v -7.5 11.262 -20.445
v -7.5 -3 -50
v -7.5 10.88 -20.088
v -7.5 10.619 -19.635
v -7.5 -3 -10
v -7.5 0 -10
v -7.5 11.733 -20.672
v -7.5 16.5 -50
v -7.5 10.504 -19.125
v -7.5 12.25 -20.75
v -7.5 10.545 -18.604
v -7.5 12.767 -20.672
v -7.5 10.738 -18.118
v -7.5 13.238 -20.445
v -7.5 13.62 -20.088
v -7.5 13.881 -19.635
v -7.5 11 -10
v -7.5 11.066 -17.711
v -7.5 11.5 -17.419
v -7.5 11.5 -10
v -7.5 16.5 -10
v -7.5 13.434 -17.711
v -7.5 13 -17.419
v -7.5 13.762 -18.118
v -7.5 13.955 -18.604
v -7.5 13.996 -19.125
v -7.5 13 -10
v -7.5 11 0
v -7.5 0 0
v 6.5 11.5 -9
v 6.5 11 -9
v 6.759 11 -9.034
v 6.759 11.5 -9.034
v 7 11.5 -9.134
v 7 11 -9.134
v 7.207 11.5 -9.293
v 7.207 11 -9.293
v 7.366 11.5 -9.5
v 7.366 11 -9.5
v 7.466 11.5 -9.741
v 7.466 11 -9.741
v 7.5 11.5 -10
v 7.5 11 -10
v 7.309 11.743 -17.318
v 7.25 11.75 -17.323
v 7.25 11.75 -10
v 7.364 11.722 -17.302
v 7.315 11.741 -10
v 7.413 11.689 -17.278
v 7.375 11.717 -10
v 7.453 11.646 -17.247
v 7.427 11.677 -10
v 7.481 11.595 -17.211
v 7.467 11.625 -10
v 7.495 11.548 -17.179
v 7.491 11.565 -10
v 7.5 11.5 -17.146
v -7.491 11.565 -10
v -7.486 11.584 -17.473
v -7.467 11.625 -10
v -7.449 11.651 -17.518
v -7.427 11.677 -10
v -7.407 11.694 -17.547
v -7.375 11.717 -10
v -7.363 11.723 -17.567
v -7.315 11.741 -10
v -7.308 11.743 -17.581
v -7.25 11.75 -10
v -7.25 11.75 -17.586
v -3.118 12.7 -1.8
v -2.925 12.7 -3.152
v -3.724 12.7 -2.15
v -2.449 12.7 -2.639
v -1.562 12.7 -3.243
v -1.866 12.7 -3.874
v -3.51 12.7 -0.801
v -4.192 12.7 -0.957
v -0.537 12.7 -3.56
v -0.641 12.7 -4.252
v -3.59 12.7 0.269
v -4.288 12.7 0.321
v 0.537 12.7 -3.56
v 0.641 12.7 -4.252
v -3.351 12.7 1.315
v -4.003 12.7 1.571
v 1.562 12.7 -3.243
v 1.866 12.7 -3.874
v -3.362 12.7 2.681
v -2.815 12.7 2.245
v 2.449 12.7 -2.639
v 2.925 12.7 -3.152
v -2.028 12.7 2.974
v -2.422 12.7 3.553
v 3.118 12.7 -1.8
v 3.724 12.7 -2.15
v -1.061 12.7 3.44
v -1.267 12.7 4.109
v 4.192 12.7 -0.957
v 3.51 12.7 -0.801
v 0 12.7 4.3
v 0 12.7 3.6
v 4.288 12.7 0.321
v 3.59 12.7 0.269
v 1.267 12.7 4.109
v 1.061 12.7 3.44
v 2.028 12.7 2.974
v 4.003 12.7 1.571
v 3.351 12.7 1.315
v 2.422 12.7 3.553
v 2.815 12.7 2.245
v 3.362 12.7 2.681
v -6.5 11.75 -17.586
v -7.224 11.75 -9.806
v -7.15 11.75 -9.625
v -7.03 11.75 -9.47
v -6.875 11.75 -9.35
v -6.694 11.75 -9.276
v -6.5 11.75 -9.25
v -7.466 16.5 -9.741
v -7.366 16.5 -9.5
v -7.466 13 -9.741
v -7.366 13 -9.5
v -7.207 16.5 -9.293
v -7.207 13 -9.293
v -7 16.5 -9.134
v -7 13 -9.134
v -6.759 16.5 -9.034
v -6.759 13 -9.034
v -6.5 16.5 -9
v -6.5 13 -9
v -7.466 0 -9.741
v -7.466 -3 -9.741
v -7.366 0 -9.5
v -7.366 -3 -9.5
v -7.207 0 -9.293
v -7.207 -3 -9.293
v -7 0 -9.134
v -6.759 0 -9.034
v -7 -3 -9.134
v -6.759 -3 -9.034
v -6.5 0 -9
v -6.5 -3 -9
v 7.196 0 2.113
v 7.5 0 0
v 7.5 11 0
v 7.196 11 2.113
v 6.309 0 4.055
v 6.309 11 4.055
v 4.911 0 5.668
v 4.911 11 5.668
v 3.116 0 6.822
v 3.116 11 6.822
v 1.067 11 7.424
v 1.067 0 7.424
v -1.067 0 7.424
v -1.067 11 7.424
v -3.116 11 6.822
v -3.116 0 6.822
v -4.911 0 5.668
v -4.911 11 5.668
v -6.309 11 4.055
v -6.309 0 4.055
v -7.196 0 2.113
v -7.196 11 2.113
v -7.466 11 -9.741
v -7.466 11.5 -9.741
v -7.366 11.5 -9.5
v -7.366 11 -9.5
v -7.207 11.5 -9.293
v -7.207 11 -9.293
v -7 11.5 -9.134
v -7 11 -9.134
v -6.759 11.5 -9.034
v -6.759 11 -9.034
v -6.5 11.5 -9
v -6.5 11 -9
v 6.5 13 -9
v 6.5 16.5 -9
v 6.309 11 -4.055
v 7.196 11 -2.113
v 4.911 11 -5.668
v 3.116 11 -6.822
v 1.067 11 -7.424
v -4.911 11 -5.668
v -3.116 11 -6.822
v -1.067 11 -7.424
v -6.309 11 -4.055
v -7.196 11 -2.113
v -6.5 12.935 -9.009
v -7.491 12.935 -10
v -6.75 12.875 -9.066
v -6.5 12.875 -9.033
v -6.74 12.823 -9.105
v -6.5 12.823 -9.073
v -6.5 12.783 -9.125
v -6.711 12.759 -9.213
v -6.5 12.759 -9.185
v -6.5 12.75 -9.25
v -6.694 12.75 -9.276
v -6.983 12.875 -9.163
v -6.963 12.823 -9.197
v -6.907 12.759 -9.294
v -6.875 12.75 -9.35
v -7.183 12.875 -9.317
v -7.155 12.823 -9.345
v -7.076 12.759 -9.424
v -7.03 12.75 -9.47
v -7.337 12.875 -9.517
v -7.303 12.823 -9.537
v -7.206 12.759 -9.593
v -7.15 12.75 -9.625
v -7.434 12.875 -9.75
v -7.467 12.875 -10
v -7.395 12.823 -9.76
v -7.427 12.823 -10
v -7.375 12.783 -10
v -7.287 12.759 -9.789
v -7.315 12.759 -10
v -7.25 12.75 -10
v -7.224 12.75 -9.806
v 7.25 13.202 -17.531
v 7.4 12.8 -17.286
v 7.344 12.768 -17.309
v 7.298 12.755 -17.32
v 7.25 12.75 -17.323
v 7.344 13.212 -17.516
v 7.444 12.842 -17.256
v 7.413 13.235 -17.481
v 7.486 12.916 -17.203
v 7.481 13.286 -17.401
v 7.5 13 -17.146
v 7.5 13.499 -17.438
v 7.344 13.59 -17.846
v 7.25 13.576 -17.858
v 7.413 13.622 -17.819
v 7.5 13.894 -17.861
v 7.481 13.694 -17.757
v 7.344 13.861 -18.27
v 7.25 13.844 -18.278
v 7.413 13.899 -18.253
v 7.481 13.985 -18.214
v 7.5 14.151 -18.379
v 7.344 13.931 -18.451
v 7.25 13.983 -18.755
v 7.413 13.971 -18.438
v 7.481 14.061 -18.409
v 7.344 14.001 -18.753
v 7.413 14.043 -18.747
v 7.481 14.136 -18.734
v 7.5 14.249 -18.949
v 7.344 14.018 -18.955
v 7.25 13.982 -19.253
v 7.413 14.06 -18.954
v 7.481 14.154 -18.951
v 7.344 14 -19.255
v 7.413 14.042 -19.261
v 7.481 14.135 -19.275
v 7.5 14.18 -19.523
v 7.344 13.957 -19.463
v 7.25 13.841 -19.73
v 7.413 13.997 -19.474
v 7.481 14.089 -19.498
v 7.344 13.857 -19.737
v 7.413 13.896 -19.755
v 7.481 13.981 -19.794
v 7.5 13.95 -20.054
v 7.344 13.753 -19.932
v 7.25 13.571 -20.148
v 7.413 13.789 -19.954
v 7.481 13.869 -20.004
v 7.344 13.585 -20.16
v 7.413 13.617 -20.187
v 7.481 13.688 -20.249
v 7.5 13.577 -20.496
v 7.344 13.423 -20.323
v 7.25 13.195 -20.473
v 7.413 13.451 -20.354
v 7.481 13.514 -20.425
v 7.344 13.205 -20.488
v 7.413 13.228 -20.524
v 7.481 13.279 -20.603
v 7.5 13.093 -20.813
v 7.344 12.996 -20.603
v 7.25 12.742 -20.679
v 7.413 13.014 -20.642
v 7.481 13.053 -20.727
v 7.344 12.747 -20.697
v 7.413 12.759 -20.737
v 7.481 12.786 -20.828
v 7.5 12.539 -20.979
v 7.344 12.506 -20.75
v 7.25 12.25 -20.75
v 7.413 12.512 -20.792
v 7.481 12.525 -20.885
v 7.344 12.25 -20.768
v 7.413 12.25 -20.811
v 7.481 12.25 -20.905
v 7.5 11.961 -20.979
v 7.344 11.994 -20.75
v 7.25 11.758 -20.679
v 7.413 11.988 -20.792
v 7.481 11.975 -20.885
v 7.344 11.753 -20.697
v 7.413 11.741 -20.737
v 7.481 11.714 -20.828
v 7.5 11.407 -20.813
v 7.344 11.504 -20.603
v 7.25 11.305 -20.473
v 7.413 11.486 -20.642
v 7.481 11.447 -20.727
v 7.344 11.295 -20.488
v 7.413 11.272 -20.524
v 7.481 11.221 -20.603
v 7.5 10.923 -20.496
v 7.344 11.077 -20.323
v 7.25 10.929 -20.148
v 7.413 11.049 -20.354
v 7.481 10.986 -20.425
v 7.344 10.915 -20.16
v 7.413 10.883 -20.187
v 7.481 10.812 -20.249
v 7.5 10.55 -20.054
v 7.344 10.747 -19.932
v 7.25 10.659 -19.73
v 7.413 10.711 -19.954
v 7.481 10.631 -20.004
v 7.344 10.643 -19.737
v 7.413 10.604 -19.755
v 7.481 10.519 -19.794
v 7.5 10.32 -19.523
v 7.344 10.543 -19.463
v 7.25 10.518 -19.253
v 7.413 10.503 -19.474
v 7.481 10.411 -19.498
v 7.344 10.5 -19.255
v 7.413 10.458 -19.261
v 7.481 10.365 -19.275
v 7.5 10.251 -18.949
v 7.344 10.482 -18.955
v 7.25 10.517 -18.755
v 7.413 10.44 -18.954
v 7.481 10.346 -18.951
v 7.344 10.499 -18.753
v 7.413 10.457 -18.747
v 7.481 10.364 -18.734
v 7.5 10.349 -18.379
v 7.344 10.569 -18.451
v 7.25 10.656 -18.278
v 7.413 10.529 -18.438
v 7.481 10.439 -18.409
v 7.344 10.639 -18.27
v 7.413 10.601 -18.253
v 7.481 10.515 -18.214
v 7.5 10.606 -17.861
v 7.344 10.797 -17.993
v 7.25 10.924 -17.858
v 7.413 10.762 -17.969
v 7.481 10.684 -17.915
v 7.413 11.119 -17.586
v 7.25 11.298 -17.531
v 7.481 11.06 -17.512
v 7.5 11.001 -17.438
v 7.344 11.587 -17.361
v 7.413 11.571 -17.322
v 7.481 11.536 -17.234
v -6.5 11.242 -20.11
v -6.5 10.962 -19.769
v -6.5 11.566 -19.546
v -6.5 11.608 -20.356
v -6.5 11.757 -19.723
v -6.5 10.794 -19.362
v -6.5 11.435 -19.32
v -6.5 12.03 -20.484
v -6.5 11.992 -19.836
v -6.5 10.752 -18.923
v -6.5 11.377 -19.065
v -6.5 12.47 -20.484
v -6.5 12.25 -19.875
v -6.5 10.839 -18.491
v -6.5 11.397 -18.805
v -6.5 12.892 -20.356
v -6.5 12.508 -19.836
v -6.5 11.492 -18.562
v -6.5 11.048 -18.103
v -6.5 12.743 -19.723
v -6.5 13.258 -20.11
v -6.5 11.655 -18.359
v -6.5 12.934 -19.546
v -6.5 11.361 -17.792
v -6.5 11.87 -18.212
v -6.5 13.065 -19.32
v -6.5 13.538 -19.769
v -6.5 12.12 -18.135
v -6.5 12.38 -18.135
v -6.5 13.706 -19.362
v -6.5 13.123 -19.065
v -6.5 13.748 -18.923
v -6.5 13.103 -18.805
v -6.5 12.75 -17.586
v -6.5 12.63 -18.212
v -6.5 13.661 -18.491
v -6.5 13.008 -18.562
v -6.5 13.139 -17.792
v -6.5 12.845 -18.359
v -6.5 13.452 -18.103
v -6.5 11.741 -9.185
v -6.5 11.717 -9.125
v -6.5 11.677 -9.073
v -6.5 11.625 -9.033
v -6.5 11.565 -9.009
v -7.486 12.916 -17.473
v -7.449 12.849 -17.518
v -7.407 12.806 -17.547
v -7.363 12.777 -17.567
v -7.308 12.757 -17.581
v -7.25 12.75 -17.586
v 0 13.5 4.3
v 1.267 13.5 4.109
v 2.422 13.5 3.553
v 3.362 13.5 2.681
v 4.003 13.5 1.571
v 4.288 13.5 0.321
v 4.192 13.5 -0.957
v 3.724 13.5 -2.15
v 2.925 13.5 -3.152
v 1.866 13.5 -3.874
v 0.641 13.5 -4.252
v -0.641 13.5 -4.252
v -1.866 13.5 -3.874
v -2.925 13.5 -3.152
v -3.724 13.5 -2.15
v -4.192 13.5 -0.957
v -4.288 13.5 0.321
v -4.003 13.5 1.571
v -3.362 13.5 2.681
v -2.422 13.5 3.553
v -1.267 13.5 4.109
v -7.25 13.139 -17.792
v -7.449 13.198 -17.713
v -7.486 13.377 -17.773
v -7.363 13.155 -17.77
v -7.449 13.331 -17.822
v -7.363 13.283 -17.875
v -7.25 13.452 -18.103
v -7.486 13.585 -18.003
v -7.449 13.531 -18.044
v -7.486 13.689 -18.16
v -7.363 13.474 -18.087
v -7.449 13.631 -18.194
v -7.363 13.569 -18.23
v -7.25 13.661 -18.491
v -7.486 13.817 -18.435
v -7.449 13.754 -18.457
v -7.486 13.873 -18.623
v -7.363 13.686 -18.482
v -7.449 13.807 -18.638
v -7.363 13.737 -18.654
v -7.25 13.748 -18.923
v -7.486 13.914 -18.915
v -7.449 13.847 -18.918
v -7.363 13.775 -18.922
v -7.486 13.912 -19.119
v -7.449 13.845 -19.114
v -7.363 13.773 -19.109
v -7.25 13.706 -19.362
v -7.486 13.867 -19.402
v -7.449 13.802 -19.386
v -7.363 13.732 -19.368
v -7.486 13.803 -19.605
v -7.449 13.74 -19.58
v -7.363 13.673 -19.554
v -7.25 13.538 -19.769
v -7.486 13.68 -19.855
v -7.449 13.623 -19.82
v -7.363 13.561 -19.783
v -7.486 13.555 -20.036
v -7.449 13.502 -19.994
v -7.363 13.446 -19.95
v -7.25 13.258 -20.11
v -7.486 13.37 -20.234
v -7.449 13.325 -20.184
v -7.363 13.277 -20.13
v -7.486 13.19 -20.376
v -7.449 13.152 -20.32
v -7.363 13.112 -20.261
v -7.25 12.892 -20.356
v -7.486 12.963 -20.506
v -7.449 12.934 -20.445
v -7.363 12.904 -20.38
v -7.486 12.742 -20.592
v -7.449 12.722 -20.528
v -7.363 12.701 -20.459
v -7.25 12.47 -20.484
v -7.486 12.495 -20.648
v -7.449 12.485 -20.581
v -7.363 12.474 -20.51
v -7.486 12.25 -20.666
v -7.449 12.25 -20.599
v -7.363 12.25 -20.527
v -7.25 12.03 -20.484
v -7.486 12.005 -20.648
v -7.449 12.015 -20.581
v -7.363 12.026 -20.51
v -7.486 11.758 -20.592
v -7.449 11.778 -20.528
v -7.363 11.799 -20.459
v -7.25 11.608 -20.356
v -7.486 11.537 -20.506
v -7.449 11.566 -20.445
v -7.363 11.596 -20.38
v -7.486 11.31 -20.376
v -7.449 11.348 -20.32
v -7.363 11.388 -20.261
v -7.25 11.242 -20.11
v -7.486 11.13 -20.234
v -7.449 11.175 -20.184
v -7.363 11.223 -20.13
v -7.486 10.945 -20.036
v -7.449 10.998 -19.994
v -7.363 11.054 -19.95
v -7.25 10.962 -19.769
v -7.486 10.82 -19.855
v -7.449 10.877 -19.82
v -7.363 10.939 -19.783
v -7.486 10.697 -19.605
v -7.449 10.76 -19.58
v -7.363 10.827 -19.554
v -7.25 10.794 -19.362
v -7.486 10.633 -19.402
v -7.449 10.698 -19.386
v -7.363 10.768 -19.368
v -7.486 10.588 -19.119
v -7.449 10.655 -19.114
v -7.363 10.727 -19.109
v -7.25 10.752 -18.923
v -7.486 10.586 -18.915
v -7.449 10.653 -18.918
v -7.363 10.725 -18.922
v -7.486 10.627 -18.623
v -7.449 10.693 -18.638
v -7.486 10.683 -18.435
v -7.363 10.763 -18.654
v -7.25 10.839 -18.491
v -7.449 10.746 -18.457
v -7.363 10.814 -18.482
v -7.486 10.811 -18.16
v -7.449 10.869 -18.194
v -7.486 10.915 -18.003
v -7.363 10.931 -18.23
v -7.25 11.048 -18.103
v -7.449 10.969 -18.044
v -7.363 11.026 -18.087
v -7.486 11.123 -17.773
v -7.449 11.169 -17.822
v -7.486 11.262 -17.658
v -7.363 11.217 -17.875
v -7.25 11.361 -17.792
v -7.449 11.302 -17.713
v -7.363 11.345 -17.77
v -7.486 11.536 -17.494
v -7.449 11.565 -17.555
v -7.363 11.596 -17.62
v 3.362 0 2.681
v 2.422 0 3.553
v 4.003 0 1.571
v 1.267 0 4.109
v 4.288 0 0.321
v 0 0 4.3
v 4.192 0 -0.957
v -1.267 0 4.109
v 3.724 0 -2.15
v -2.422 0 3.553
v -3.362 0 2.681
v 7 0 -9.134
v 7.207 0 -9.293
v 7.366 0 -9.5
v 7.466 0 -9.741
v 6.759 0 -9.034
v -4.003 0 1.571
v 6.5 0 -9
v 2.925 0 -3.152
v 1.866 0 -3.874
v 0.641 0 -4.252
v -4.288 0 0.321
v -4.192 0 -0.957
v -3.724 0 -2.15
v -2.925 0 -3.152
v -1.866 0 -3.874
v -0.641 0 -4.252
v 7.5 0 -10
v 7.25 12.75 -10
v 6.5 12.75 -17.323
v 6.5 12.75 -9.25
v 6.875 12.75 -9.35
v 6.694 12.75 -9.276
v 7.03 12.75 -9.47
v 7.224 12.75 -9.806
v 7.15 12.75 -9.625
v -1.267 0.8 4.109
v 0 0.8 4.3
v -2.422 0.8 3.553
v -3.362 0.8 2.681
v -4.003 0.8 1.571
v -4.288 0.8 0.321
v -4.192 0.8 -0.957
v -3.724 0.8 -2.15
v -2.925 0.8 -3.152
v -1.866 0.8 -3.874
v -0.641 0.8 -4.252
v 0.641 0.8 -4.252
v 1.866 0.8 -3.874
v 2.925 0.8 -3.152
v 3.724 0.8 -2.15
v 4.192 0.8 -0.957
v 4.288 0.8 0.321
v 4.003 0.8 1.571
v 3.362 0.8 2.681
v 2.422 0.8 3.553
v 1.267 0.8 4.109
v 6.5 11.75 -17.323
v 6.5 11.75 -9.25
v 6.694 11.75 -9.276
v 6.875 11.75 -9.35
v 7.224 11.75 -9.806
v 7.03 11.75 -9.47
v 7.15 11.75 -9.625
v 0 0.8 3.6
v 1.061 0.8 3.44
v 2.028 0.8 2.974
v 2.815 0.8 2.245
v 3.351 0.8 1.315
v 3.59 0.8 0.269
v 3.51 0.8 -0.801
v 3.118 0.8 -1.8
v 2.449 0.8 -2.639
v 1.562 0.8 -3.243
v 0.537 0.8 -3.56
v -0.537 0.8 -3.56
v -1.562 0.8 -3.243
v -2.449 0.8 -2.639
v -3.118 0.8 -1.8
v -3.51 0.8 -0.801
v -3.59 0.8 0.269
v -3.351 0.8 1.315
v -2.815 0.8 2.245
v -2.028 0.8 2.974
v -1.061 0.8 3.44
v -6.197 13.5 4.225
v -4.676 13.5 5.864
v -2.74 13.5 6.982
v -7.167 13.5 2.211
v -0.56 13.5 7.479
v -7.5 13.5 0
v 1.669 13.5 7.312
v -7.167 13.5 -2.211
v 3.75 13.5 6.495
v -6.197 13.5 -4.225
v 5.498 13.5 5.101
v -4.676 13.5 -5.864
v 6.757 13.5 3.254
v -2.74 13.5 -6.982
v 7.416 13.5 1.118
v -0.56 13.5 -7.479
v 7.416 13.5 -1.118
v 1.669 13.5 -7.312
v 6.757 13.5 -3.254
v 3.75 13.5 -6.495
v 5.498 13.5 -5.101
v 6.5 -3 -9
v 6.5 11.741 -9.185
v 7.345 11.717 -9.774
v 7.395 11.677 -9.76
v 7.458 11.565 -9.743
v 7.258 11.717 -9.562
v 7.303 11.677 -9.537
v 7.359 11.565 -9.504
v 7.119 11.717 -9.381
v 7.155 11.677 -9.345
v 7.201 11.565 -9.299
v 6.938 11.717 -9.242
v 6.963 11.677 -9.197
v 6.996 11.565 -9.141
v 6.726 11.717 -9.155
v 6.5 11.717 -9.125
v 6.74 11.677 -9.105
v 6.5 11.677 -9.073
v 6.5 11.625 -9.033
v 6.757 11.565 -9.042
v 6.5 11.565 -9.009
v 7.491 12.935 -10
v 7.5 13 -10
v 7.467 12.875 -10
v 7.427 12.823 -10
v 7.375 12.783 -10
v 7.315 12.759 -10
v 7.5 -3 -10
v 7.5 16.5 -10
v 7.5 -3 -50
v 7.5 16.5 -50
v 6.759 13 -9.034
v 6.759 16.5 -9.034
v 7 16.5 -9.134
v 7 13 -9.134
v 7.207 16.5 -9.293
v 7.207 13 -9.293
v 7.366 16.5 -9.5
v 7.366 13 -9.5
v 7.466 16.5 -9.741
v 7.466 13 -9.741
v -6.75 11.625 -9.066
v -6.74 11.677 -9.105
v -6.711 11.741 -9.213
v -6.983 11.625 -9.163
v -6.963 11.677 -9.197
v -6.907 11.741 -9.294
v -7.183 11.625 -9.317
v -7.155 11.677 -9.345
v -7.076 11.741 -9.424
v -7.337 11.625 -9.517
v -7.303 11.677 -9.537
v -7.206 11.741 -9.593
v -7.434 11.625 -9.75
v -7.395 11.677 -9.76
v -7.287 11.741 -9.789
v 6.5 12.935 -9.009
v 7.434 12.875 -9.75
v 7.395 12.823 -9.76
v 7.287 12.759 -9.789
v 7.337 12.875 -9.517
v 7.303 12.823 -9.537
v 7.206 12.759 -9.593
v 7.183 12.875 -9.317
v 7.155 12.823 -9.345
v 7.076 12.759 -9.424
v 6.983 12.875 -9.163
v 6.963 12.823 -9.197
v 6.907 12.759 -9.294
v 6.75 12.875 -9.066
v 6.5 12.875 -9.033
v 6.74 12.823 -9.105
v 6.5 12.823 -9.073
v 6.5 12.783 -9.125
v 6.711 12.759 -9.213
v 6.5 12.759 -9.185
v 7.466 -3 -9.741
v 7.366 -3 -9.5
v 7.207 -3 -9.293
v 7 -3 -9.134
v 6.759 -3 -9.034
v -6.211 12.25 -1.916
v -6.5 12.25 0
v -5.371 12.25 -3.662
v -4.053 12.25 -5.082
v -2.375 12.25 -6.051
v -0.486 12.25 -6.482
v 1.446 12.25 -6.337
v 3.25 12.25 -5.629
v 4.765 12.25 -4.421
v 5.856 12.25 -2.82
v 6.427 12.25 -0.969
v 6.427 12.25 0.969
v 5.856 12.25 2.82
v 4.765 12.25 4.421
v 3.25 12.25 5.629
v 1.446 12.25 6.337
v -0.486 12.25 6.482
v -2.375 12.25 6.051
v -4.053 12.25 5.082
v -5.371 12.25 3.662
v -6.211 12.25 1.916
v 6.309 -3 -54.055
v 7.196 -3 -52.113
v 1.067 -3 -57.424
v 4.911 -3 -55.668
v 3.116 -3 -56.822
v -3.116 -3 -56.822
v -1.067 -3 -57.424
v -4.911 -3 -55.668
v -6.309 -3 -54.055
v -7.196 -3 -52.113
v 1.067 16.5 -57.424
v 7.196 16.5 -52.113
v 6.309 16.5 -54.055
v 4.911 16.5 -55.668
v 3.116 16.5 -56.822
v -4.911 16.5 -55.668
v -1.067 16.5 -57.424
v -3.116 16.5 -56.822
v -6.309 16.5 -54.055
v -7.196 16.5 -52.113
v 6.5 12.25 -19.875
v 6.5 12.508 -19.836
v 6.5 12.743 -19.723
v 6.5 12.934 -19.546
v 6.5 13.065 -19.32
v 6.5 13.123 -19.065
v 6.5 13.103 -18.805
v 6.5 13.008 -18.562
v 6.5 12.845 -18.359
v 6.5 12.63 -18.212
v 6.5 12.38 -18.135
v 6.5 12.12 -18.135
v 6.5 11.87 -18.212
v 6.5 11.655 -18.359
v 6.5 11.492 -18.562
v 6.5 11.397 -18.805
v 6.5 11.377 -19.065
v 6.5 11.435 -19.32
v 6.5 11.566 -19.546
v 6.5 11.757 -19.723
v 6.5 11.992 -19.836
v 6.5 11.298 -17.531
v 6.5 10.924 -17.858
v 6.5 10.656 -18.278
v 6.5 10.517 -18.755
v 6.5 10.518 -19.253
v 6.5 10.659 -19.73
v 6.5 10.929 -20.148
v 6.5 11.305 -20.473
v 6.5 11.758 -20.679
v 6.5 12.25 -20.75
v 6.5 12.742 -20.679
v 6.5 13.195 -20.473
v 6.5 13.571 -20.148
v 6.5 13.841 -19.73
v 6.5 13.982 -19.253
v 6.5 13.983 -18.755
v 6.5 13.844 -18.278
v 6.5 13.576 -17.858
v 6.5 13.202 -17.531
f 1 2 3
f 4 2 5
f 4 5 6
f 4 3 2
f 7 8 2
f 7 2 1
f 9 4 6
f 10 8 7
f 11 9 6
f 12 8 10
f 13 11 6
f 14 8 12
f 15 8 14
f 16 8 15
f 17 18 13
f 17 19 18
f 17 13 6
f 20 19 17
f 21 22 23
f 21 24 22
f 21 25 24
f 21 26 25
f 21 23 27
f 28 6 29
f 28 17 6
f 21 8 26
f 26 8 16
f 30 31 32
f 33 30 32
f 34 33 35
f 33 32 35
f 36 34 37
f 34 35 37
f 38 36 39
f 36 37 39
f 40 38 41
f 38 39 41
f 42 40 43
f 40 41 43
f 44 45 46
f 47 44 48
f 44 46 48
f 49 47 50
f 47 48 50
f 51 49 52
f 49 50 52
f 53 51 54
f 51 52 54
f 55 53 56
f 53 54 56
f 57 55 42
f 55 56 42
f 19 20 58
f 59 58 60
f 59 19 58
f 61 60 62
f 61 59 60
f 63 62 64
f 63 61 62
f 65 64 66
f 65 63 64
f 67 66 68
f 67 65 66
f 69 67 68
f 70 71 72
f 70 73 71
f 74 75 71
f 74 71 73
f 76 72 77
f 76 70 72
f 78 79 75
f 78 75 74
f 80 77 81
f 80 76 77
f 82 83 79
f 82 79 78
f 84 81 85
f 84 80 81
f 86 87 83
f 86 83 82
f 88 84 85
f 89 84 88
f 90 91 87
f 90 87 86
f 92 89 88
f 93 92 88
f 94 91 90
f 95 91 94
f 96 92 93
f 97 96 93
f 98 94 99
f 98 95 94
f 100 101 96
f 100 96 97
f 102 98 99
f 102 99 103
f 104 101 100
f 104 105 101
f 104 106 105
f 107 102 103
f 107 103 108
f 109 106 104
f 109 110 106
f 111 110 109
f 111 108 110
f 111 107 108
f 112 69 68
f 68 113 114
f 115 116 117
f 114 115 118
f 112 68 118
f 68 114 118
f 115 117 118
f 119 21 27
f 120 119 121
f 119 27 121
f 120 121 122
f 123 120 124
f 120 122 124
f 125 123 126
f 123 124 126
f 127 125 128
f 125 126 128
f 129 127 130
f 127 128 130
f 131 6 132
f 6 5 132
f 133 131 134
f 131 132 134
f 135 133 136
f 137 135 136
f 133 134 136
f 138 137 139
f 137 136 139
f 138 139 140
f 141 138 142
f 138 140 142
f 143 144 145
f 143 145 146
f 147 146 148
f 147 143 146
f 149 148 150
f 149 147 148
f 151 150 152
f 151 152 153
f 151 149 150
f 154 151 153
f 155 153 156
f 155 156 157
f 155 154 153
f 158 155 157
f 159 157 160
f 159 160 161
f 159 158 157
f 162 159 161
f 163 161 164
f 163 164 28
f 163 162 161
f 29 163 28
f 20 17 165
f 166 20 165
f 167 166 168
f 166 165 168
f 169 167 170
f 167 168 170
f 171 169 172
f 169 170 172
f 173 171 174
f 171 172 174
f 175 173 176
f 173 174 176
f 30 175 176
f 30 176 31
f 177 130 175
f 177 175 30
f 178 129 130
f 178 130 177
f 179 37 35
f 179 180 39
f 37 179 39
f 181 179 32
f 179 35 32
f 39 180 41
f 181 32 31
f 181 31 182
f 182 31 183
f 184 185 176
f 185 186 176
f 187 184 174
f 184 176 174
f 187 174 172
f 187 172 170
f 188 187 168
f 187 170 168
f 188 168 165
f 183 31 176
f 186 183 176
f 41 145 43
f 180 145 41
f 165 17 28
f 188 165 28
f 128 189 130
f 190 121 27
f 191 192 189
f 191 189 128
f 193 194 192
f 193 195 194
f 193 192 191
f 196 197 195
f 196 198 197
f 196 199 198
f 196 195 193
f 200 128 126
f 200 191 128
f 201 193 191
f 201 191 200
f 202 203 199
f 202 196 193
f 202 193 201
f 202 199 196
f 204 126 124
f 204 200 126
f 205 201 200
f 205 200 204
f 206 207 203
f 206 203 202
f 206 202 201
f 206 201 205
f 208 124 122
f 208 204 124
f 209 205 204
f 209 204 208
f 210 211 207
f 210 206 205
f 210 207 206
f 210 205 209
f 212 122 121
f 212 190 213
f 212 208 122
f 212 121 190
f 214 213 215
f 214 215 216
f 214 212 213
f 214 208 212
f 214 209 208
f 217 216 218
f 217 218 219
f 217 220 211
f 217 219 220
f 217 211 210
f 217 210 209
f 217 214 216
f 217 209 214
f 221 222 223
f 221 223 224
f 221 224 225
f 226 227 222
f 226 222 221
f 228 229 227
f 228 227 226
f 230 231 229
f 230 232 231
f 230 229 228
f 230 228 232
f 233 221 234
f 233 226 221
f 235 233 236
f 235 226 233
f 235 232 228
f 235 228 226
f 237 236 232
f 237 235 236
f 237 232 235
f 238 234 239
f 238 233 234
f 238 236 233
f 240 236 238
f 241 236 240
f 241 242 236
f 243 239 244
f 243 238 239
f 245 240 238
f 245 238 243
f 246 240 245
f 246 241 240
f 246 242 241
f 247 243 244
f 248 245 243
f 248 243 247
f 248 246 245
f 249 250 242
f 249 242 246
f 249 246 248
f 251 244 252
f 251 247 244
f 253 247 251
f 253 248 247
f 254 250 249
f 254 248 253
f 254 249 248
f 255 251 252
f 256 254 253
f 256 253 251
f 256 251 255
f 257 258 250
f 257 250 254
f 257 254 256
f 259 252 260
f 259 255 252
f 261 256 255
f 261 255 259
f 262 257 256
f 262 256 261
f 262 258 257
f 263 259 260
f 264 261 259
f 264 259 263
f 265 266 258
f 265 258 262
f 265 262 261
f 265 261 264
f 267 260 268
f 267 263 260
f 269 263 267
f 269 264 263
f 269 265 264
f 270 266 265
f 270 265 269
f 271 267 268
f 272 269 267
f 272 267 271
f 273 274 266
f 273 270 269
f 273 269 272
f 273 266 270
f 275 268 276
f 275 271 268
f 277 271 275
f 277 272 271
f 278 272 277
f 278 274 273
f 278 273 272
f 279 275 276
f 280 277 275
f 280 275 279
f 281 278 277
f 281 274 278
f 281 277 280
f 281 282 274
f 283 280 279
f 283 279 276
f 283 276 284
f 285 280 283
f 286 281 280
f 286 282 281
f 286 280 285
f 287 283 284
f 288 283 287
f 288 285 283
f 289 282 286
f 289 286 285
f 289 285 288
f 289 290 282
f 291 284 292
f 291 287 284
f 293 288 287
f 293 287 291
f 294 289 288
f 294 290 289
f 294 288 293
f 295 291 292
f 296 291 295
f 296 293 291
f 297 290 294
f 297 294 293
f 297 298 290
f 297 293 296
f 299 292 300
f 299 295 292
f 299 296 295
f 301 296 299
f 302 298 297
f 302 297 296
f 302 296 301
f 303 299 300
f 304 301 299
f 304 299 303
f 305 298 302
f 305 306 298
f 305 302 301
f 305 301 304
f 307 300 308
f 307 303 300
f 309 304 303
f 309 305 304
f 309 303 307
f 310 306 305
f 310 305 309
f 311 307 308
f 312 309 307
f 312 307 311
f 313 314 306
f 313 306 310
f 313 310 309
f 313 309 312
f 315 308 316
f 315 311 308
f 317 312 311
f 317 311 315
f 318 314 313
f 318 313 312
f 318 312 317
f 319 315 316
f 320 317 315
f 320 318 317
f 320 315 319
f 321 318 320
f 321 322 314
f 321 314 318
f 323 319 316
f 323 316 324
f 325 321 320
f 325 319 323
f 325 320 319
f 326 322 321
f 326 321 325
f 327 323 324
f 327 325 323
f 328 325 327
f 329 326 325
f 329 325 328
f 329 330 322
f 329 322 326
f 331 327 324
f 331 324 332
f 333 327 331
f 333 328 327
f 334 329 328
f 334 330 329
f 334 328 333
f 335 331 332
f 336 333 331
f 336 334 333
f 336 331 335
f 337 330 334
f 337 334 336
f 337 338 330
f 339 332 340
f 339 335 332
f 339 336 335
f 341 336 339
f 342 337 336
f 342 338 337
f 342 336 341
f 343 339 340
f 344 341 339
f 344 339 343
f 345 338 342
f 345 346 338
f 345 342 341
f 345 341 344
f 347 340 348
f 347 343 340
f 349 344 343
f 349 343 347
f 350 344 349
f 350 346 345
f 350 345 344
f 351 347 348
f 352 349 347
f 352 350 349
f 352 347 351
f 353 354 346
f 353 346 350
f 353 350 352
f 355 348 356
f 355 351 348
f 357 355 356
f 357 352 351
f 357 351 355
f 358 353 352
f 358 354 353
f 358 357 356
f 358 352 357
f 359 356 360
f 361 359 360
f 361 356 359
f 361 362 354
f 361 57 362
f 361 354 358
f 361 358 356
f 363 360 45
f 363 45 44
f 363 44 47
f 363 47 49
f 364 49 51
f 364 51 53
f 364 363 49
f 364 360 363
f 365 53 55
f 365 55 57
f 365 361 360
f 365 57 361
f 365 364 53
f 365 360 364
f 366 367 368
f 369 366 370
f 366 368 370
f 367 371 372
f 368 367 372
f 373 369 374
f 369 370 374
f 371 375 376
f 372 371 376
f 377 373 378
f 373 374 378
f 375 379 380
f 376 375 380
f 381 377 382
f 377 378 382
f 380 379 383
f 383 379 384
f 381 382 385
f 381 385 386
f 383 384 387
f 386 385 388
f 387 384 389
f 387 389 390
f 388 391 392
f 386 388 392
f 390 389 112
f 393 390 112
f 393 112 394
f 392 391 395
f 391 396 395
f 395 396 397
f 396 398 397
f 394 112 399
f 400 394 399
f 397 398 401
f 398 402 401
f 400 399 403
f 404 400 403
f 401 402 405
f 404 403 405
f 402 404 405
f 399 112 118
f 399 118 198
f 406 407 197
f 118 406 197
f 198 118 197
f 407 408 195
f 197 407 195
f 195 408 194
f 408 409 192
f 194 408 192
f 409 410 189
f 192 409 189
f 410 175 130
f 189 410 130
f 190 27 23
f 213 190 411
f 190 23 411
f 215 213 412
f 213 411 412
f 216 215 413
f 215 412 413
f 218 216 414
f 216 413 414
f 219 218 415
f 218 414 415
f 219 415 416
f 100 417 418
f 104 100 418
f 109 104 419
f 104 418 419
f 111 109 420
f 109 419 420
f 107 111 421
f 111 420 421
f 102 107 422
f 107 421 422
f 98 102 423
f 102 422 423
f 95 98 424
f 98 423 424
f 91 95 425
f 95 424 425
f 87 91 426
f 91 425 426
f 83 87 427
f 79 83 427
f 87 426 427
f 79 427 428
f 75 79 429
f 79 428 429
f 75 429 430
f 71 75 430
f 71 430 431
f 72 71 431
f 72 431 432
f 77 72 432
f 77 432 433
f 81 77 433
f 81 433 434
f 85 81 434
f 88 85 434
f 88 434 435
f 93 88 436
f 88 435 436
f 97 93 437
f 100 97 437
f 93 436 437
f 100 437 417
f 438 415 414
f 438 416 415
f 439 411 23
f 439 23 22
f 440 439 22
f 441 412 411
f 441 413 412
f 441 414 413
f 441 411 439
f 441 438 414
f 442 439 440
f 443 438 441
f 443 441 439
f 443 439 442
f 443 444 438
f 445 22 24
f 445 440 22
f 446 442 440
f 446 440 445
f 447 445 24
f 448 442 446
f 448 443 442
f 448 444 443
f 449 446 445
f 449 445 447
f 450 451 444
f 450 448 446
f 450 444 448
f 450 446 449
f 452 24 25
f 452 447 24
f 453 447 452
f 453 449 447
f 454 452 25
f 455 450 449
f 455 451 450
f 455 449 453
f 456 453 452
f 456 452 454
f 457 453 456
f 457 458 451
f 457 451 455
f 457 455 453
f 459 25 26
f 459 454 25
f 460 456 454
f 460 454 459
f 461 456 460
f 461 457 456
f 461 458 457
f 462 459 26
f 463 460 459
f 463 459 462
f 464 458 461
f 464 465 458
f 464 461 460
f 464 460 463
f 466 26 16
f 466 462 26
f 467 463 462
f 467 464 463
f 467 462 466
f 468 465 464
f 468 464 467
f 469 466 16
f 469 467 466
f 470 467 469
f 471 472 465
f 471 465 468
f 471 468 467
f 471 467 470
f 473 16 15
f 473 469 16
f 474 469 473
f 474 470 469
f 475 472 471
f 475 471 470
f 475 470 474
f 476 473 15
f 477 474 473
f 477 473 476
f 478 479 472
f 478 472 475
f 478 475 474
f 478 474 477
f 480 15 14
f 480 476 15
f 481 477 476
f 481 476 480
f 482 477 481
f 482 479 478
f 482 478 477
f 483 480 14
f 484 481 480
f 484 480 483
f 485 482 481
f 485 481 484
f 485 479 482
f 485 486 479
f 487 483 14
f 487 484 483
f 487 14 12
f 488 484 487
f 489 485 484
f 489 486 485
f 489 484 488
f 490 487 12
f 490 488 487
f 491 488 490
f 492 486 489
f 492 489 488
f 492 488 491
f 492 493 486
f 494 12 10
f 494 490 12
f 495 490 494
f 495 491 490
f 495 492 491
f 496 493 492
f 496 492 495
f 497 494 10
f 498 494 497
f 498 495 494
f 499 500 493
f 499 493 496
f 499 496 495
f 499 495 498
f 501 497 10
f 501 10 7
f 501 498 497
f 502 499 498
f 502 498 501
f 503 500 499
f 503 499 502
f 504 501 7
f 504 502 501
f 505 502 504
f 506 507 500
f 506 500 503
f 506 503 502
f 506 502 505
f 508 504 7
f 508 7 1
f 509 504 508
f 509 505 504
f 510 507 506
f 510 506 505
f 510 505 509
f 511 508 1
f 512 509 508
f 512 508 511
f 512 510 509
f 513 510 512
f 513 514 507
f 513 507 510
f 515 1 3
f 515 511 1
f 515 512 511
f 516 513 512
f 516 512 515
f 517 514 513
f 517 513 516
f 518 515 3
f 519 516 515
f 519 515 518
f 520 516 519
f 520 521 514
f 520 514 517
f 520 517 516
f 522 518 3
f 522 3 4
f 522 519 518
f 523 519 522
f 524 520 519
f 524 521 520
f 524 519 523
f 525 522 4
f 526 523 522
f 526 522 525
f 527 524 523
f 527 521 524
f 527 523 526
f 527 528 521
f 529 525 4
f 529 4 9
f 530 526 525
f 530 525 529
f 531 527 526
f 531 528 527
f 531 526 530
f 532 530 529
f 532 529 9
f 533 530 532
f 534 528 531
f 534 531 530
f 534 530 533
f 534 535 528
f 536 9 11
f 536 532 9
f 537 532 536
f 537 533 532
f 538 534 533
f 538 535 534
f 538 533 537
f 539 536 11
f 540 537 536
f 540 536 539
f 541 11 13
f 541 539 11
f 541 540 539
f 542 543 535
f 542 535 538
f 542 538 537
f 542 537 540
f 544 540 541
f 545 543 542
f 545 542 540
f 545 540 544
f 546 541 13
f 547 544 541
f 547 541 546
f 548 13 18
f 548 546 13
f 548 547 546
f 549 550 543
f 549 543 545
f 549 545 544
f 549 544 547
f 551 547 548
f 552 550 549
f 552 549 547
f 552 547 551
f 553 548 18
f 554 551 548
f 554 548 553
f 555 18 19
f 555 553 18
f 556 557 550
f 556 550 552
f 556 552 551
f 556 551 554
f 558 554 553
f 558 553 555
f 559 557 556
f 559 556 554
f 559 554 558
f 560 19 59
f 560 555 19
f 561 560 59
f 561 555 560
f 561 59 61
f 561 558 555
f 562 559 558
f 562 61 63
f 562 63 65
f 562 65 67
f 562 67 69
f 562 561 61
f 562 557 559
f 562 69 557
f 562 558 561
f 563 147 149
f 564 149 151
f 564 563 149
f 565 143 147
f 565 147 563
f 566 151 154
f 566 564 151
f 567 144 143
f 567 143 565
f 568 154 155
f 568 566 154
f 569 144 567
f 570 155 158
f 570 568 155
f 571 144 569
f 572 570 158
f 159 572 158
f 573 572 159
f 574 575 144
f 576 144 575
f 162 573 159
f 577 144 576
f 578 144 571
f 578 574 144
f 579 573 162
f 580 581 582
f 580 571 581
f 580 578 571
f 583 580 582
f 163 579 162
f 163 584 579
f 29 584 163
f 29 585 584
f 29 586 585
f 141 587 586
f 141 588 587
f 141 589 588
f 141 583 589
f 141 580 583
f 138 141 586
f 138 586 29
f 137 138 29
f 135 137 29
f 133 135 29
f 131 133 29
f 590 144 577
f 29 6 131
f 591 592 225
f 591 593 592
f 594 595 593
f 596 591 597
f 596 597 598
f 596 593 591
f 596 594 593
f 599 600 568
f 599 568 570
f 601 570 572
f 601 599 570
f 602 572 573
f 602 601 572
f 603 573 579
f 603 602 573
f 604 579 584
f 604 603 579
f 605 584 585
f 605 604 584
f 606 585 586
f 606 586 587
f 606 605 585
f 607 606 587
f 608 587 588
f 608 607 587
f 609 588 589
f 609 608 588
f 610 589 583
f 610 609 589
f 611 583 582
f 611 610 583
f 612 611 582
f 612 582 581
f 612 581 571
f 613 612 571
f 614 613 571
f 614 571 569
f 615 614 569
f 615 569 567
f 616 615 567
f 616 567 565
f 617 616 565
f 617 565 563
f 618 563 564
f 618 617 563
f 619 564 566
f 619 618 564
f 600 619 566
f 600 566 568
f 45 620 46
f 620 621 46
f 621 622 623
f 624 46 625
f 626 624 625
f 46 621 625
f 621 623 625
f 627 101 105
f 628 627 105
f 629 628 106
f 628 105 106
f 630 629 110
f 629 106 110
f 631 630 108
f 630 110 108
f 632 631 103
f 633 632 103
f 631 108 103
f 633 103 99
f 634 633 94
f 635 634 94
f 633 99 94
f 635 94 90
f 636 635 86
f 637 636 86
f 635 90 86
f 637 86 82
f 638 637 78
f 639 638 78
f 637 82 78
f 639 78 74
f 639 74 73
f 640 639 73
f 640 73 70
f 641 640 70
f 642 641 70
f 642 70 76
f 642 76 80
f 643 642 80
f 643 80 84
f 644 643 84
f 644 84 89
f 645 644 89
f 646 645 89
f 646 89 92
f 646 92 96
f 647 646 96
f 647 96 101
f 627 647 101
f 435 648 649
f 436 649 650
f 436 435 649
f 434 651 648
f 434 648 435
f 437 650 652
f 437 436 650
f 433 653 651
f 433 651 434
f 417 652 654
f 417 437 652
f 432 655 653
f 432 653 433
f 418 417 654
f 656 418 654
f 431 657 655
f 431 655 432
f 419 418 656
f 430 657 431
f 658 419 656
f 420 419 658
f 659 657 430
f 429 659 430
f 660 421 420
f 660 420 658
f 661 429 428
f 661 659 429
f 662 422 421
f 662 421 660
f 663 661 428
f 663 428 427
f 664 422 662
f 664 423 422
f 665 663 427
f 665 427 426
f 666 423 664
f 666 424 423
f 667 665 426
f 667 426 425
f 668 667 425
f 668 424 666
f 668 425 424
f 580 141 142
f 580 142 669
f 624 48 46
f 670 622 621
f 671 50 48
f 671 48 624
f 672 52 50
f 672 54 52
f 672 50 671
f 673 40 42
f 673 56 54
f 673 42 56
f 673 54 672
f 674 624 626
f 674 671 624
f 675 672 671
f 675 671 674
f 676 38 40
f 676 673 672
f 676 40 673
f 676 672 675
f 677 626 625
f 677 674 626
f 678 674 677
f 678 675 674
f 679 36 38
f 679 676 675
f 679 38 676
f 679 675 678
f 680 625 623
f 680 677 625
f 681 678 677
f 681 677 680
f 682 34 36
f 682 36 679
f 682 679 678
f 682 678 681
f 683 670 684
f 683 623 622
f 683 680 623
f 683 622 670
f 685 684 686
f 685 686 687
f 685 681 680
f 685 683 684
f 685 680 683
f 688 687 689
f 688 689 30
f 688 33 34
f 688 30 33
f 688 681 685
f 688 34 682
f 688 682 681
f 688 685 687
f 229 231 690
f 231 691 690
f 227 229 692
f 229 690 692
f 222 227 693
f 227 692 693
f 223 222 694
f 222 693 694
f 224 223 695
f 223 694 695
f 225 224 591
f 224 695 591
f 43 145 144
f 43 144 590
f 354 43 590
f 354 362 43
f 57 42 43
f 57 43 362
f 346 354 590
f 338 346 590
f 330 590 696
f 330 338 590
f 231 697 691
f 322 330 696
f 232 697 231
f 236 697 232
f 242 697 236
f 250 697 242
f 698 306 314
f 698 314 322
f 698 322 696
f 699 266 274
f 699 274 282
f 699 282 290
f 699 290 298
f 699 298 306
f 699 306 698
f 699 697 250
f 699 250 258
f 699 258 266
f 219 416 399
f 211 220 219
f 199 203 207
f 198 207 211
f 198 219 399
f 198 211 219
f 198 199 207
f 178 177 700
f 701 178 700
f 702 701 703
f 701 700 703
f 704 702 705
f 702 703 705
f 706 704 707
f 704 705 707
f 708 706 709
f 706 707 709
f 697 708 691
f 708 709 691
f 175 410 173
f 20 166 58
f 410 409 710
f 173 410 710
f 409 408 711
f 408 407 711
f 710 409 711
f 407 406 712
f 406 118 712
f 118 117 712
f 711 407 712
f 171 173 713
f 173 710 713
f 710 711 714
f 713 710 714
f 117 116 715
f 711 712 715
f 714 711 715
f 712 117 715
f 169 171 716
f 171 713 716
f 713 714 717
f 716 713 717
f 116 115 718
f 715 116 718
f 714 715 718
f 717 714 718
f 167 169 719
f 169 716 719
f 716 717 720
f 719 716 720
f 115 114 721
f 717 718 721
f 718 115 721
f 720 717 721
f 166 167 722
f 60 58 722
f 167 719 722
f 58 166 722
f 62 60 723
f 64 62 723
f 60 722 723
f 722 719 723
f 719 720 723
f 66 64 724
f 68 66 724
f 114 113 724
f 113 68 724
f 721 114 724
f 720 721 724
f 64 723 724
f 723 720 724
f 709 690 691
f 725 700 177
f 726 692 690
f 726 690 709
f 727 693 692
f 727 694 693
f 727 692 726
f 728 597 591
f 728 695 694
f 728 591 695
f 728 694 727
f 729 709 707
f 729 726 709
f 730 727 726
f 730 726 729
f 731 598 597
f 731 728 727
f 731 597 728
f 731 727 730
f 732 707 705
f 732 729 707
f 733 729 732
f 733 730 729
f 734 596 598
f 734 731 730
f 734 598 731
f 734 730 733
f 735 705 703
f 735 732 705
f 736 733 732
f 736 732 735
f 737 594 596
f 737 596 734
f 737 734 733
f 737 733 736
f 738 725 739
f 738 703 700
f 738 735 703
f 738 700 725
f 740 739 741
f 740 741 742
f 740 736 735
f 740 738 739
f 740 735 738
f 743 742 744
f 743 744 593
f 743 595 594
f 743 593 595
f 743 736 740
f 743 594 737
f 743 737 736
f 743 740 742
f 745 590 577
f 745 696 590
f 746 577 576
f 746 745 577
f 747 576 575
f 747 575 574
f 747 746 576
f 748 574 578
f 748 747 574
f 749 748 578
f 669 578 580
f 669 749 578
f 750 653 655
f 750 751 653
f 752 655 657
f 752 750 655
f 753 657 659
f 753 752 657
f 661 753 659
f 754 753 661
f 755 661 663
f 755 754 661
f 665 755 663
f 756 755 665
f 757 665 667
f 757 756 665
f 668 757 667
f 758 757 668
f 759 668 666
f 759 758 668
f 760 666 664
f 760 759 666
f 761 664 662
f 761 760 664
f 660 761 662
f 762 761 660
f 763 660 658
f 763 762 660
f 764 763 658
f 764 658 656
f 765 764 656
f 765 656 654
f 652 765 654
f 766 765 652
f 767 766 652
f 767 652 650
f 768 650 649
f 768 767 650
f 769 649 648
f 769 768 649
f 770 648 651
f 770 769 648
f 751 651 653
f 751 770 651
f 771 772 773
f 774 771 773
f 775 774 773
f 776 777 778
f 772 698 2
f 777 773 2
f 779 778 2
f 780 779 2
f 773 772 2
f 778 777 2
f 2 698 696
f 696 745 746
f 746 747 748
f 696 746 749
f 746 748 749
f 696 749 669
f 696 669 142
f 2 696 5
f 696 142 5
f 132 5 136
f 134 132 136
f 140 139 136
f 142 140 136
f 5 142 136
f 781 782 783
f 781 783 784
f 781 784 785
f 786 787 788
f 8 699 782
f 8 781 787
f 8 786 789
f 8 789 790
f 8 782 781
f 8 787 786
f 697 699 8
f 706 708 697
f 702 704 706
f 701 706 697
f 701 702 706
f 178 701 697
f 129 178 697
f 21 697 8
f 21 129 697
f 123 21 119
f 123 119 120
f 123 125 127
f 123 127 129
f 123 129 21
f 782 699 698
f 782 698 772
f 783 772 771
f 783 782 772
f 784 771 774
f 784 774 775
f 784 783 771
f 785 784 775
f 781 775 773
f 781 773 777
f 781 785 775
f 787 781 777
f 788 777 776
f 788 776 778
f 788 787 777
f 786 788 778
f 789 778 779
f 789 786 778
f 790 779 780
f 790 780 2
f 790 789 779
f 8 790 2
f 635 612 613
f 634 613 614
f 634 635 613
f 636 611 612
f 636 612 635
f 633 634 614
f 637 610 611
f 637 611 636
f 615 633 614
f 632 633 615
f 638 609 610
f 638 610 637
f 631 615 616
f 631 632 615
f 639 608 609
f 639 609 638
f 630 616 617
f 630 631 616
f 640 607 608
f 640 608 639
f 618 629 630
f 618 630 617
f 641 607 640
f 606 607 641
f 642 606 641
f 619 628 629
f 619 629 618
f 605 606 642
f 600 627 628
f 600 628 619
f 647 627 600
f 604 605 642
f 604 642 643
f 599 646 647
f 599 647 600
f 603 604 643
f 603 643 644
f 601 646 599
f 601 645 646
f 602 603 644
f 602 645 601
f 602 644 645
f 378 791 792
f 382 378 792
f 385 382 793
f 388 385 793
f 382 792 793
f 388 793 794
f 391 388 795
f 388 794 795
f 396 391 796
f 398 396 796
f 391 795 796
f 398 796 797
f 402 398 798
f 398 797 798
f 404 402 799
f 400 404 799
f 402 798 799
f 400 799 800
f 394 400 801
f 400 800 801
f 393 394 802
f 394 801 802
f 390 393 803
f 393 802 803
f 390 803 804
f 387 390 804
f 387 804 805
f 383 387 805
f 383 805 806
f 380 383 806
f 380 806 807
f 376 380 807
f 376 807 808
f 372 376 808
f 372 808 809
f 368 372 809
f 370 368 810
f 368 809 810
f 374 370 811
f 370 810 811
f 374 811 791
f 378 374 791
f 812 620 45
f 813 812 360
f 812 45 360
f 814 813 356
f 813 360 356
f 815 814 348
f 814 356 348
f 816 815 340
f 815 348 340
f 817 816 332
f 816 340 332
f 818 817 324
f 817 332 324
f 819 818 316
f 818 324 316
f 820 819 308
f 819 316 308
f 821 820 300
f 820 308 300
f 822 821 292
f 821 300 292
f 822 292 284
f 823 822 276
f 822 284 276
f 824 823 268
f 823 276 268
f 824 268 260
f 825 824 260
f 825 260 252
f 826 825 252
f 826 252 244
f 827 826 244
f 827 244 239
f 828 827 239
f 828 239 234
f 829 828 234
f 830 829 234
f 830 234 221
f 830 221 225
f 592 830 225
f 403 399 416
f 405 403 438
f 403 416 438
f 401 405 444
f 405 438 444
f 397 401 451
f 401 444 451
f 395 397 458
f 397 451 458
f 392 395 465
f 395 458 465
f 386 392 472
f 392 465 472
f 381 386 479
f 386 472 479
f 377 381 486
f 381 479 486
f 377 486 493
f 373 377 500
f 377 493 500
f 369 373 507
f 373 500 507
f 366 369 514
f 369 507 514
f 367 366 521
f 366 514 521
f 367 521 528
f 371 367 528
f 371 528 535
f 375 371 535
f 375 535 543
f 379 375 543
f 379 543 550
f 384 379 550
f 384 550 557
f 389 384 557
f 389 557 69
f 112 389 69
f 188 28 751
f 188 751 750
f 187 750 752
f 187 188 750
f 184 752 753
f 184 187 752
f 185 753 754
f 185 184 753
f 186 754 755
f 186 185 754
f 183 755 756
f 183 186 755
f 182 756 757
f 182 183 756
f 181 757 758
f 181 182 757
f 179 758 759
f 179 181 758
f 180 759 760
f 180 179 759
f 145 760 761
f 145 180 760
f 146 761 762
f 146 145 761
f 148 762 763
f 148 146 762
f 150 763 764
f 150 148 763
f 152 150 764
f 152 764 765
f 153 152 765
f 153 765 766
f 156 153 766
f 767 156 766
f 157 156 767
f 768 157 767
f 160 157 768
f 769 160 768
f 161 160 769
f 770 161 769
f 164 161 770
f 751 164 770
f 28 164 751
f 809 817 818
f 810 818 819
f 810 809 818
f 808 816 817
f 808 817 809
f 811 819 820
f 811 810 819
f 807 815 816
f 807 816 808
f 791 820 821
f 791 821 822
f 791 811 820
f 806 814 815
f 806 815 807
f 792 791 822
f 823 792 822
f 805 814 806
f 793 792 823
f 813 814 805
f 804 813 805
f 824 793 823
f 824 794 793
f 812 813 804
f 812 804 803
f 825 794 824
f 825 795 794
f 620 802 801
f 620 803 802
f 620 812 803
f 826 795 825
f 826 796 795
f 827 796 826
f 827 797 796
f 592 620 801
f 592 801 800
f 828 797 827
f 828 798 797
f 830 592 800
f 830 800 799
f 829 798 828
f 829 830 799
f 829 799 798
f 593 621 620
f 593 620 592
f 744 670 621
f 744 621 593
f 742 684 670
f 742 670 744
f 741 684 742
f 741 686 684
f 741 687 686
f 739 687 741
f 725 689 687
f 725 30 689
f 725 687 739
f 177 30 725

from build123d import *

# Parameters (mm, degrees)
EXTRUDE_1_DEPTH      = 11
EXTRUDE_2_DEPTH      = 3
EXTRUDE_2_DEPTH_BACK = 16.5
FILLET_1_R           = 1
SKETCH_6_W           = 1
SKETCH_6_H           = 1
CUT_EXTRUDE_3_DEPTH  = 10
CUT_EXTRUDE_4_REACH  = 63.673
SKETCH_8_R           = 0.5
SKETCH_9_R           = 1.5
CUT_EXTRUDE_5_DEPTH  = 1
SKETCH_10_R          = 1.75
CUT_EXTRUDE_6_DEPTH  = 1
FILLET_2_R           = 0.25
SKETCH_11_R          = 2
CUT_EXTRUDE_7_DEPTH  = 13.5
SKETCH_13_R          = 3.6
CUT_EXTRUDE_8_DEPTH  = 13.5
SKETCH_14_R          = 4.3
CUT_EXTRUDE_9_DEPTH  = 0.8
CUT_EXTRUDE_START    = -0.8
SKETCH_15_R          = 4.3
CUT_EXTRUDE_10_DEPTH = 0.8
SKETCH_16_R          = 0.875
CUT_EXTRUDE_11_DEPTH = 13


with BuildPart() as part:
    # 스케치1 → 보스-돌출1 (new body)
    with BuildSketch(Plane(origin=(0, 0, 0), x_dir=(1, 0, 0), z_dir=(0, 1, 0))):
        with BuildLine():
            Line((-7.5, 0), (-7.5, 50))
            ThreePointArc((-7.5, 50), (0, 57.5), (7.5, 50))
            Line((7.5, 50), (7.5, 0))
            ThreePointArc((7.5, 0), (0, -7.5), (-7.5, 0))
        make_face()
    extrude(amount=EXTRUDE_1_DEPTH)

    # 스케치2 → 회전1 (revolve)
    with BuildSketch(Plane.XY):
        Polygon((-7.5, 11), (0, 11), (0, 13.5), (-7.5, 13.5), (-6.5, 12.25), align=None)
    revolve(axis=Axis((0, 13.5, 0), (0, -1, 0)))

    # 스케치3 → 보스-돌출2 (add, two sides: drawn at the far end of the back side and taken through both)
    with BuildSketch(Plane.XZ.offset(-EXTRUDE_2_DEPTH_BACK)):
        with BuildLine():
            Line((-7.5, -50), (-7.5, -9))
            Line((-7.5, -9), (7.5, -9))
            Line((7.5, -9), (7.5, -50))
            ThreePointArc((7.5, -50), (0, -57.5), (-7.5, -50))
        make_face()
    extrude(amount=EXTRUDE_2_DEPTH + EXTRUDE_2_DEPTH_BACK)

    # 필렛1
    fillet_1_edges = [part.edges().sort_by_distance(p)[0] for p in [
        (7.5, -1.5, -9),
        (-7.5, -1.5, -9),
        (7.5, 13.75, -9),
        (-7.5, 13.75, -9),
    ]]
    fillet(fillet_1_edges, radius=FILLET_1_R)

    # 스케치6 → 컷-돌출3 (cut)
    with BuildSketch(Plane.XY.offset(-9)):
        with Locations((-7, 12.25)):
            Rectangle(SKETCH_6_W, SKETCH_6_H)
        with Locations((7, 12.25)):
            Rectangle(SKETCH_6_W, SKETCH_6_H)
    extrude(amount=-CUT_EXTRUDE_3_DEPTH, mode=Mode.SUBTRACT)

    # 컷-돌출4: up to this face of the body (flat: up to its plane)
    cut_extrude_4_end = Plane(part.part.faces().sort_by_distance((7.5, 6.537741203, -27.036889898))[0])
    # 스케치8 → 컷-돌출4 (cut, up to the picked face)
    with BuildSketch(Plane.ZY.offset(7.5), mode=Mode.PRIVATE) as cut_extrude_4_sk1:
        with Locations(Location((-19, 12.25, 0), (0, 0, 270))):
            Circle(SKETCH_8_R)
    cut_extrude_4_tool1 = split(extrude(cut_extrude_4_sk1.sketch, amount=-CUT_EXTRUDE_4_REACH, mode=Mode.PRIVATE), bisect_by=cut_extrude_4_end, keep=Keep.BOTH, mode=Mode.PRIVATE)
    add(cut_extrude_4_tool1.solids().sort_by(Axis((-7.5, 12.25, -19), (1, 0, 0)))[0], mode=Mode.SUBTRACT)

    # 스케치9 → 컷-돌출5 (cut)
    with BuildSketch(Plane.ZY.offset(7.5)):
        with Locations((-19, 12.25)):
            Circle(SKETCH_9_R)
    extrude(amount=-CUT_EXTRUDE_5_DEPTH, mode=Mode.SUBTRACT)

    # 스케치10 → 컷-돌출6 (cut)
    with BuildSketch(Plane(origin=(7.5, 0, 0), x_dir=(0, 0, -1), z_dir=(1, 0, 0))):
        with Locations((19, 12.25)):
            Circle(SKETCH_10_R)
    extrude(amount=-CUT_EXTRUDE_6_DEPTH, mode=Mode.SUBTRACT)

    # 필렛2
    fillet_2_edges = [part.edges().sort_by_distance(p)[0] for p in [
        (7.207106781, 12.75, -9.292893219),
        (7.207106781, 11.75, -9.292893219),
        (-7.5, 11.75, -13.792893219),
        (-7.5, 12.75, -13.792893219),
        (-7.5, 12.25, -20.5),
        (7.5, 12.75, -13.661474508),
        (7.5, 11.75, -13.661474508),
        (7.5, 12.25, -20.75),
        (-7.207106781, 11.75, -9.292893219),
        (-7.207106781, 12.75, -9.292893219),
    ]]
    fillet(fillet_2_edges, radius=FILLET_2_R)

    # 스케치11 → 컷-돌출7 (cut)
    with BuildSketch(Plane(origin=(0, 13.5, 0), x_dir=(1, 0, 0), z_dir=(0, 1, 0))):
        with Locations(Location((0, 0, 0), (0, 0, 270))):
            Circle(SKETCH_11_R)
    extrude(amount=-CUT_EXTRUDE_7_DEPTH, mode=Mode.SUBTRACT)

    # 스케치13 → 컷-돌출8 (cut)
    with BuildSketch(Plane(origin=(0, 13.5, 0), x_dir=(1, 0, 0), z_dir=(0, 1, 0))):
        with Locations(Location((0, 0, 0), (0, 0, 270))):
            Circle(SKETCH_13_R)
    extrude(amount=-CUT_EXTRUDE_8_DEPTH, mode=Mode.SUBTRACT)

    # 스케치14 → 컷-돌출9 (cut)
    with BuildSketch(Plane(origin=(0, 13.5, 0), x_dir=(1, 0, 0), z_dir=(0, 1, 0))):
        with Locations(Location((0, 0, 0), (0, 0, 270))):
            Circle(SKETCH_14_R)
    extrude(amount=-CUT_EXTRUDE_9_DEPTH, mode=Mode.SUBTRACT)

    # 스케치15 → 컷-돌출10 (cut)
    with BuildSketch(Plane(origin=(0, 0, 0), x_dir=(-1, 0, 0), z_dir=(0, -1, 0)).offset(CUT_EXTRUDE_START)):
        with Locations(Location((0, 0, 0), (0, 0, 270))):
            Circle(SKETCH_15_R)
    extrude(amount=CUT_EXTRUDE_10_DEPTH, mode=Mode.SUBTRACT)

    # 스케치16 → 컷-돌출11 (cut)
    with BuildSketch(Plane(origin=(6.5, 0, 0), x_dir=(0, 0, -1), z_dir=(1, 0, 0))):
        with Locations((19, 12.25)):
            Circle(SKETCH_16_R)
    extrude(amount=-CUT_EXTRUDE_11_DEPTH, mode=Mode.SUBTRACT)


solid = part.part
